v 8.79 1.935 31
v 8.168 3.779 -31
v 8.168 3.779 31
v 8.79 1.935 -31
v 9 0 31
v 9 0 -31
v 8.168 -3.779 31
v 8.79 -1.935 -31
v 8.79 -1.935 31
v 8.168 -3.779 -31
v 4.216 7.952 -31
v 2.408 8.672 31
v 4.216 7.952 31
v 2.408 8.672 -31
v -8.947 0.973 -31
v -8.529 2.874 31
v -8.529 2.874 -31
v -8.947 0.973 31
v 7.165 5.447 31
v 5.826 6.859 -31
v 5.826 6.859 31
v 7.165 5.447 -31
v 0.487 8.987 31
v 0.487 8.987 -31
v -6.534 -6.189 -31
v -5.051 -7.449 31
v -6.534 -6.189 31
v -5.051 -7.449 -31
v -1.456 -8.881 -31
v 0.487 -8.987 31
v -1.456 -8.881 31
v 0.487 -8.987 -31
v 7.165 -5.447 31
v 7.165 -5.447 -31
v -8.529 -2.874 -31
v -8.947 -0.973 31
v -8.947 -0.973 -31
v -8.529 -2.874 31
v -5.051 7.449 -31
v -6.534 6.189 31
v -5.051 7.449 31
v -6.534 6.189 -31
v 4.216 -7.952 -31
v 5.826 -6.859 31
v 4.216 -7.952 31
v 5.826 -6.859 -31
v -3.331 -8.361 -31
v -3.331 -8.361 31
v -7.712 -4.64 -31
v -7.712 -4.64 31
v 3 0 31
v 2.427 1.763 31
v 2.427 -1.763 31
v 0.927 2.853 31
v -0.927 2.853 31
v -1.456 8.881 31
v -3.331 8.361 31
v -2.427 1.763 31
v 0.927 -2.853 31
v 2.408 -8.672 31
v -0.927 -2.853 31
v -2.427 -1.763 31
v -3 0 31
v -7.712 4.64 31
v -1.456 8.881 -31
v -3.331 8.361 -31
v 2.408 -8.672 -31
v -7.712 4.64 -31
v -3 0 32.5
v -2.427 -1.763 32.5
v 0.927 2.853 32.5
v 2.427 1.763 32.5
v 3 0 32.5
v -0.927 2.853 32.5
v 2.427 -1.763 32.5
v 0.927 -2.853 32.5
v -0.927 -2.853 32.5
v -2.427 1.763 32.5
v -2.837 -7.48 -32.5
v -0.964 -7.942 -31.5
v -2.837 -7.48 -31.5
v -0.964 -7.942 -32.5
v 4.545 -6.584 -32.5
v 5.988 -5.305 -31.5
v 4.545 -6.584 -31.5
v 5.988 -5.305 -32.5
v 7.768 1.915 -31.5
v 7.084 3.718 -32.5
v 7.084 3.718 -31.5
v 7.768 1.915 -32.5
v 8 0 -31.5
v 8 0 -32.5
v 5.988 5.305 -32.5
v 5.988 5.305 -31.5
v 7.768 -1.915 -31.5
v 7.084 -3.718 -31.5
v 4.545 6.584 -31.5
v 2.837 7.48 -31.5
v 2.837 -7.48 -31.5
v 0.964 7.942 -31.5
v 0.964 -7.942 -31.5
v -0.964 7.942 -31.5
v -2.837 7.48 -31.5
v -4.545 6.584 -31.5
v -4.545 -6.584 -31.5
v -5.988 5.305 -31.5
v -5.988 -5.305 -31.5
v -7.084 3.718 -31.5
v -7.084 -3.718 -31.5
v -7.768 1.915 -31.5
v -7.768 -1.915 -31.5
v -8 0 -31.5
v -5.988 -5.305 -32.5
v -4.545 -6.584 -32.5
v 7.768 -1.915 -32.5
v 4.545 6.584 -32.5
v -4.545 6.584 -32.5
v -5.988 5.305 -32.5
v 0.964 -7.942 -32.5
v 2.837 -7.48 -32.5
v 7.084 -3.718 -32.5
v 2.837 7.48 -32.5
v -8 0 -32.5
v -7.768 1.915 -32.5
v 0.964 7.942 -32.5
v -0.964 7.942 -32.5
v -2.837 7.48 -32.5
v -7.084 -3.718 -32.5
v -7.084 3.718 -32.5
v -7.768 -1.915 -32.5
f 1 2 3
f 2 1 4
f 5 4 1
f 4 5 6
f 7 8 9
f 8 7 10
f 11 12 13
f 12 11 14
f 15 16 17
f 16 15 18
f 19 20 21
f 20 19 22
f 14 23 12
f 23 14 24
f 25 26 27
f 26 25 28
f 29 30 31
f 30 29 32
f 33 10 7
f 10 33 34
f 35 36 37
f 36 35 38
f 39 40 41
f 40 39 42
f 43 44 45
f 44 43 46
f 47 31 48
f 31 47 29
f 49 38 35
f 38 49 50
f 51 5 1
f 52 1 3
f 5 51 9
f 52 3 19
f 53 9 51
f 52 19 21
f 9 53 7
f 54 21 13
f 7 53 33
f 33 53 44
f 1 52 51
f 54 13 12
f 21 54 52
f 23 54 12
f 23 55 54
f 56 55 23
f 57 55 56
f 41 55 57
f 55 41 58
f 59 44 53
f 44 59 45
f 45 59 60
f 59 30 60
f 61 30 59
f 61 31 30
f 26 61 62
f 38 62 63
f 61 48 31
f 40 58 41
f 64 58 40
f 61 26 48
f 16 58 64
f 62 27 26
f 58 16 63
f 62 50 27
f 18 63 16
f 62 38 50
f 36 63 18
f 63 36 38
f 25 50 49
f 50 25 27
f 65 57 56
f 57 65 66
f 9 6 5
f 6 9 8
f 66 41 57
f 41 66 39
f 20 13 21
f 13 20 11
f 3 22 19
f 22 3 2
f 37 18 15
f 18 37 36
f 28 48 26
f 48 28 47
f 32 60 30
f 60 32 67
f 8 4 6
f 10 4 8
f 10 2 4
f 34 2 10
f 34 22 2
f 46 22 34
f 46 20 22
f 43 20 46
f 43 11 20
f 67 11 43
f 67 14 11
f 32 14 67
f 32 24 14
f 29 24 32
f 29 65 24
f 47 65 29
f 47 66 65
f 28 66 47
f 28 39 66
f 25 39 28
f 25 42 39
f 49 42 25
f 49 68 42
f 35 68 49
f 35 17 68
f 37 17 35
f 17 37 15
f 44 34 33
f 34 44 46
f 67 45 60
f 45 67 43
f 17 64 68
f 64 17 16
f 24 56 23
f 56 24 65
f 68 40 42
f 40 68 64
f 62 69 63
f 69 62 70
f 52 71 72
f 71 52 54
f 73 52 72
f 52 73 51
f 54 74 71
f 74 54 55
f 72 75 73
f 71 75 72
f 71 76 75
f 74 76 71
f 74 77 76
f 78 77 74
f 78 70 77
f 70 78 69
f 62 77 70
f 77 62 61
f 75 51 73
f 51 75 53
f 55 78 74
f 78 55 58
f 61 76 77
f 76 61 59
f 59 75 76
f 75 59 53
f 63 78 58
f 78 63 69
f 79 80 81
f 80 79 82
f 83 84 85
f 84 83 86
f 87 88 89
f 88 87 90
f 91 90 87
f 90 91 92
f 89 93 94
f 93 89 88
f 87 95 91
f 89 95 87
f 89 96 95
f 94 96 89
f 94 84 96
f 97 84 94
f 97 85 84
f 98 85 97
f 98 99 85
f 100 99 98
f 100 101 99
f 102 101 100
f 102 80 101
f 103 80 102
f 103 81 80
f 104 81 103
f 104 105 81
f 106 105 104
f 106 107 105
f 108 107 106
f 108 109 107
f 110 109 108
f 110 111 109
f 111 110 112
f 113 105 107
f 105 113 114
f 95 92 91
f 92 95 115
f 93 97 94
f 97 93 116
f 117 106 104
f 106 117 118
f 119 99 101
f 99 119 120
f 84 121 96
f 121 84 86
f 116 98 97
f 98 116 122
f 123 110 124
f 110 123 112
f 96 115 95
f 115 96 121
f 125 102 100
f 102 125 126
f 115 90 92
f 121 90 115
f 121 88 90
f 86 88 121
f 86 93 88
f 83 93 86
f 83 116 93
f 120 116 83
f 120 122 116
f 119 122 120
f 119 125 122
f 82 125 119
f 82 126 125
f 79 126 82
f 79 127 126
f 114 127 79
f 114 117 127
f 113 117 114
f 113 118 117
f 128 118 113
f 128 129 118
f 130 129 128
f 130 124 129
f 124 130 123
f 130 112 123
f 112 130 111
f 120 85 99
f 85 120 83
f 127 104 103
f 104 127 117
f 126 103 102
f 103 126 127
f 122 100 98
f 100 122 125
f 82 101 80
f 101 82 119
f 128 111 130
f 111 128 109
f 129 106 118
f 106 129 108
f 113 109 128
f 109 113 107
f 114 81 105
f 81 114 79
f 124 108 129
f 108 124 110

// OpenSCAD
// Parameters for the battery cell
battery_diameter = 18; // Diameter of the battery
battery_height = 65;   // Overall height of the battery

// Parameters for the positive terminal
positive_terminal_diameter = 6;
positive_terminal_height = 2;

// Parameters for the negative terminal
negative_terminal_diameter = 16;
negative_terminal_height = 1;

// Function to create the cylindrical cell body
module cylindrical_cell_body() {
    cylinder(h = battery_height - positive_terminal_height - negative_terminal_height, 
             d = battery_diameter, 
             center = true);
}

// Function to create the positive terminal button
module positive_terminal_button() {
    translate([0, 0, battery_height/2 - positive_terminal_height/2])
        cylinder(h = positive_terminal_height, 
                 d = positive_terminal_diameter, 
                 center = true);
}

// Function to create the negative terminal contact
module negative_terminal_contact() {
    translate([0, 0, -battery_height/2 + negative_terminal_height/2])
        cylinder(h = negative_terminal_height, 
                 d = negative_terminal_diameter, 
                 center = true);
}

// Main battery module
module battery() {
    cylindrical_cell_body();
    positive_terminal_button();
    negative_terminal_contact();
}

// Render the battery
battery();
